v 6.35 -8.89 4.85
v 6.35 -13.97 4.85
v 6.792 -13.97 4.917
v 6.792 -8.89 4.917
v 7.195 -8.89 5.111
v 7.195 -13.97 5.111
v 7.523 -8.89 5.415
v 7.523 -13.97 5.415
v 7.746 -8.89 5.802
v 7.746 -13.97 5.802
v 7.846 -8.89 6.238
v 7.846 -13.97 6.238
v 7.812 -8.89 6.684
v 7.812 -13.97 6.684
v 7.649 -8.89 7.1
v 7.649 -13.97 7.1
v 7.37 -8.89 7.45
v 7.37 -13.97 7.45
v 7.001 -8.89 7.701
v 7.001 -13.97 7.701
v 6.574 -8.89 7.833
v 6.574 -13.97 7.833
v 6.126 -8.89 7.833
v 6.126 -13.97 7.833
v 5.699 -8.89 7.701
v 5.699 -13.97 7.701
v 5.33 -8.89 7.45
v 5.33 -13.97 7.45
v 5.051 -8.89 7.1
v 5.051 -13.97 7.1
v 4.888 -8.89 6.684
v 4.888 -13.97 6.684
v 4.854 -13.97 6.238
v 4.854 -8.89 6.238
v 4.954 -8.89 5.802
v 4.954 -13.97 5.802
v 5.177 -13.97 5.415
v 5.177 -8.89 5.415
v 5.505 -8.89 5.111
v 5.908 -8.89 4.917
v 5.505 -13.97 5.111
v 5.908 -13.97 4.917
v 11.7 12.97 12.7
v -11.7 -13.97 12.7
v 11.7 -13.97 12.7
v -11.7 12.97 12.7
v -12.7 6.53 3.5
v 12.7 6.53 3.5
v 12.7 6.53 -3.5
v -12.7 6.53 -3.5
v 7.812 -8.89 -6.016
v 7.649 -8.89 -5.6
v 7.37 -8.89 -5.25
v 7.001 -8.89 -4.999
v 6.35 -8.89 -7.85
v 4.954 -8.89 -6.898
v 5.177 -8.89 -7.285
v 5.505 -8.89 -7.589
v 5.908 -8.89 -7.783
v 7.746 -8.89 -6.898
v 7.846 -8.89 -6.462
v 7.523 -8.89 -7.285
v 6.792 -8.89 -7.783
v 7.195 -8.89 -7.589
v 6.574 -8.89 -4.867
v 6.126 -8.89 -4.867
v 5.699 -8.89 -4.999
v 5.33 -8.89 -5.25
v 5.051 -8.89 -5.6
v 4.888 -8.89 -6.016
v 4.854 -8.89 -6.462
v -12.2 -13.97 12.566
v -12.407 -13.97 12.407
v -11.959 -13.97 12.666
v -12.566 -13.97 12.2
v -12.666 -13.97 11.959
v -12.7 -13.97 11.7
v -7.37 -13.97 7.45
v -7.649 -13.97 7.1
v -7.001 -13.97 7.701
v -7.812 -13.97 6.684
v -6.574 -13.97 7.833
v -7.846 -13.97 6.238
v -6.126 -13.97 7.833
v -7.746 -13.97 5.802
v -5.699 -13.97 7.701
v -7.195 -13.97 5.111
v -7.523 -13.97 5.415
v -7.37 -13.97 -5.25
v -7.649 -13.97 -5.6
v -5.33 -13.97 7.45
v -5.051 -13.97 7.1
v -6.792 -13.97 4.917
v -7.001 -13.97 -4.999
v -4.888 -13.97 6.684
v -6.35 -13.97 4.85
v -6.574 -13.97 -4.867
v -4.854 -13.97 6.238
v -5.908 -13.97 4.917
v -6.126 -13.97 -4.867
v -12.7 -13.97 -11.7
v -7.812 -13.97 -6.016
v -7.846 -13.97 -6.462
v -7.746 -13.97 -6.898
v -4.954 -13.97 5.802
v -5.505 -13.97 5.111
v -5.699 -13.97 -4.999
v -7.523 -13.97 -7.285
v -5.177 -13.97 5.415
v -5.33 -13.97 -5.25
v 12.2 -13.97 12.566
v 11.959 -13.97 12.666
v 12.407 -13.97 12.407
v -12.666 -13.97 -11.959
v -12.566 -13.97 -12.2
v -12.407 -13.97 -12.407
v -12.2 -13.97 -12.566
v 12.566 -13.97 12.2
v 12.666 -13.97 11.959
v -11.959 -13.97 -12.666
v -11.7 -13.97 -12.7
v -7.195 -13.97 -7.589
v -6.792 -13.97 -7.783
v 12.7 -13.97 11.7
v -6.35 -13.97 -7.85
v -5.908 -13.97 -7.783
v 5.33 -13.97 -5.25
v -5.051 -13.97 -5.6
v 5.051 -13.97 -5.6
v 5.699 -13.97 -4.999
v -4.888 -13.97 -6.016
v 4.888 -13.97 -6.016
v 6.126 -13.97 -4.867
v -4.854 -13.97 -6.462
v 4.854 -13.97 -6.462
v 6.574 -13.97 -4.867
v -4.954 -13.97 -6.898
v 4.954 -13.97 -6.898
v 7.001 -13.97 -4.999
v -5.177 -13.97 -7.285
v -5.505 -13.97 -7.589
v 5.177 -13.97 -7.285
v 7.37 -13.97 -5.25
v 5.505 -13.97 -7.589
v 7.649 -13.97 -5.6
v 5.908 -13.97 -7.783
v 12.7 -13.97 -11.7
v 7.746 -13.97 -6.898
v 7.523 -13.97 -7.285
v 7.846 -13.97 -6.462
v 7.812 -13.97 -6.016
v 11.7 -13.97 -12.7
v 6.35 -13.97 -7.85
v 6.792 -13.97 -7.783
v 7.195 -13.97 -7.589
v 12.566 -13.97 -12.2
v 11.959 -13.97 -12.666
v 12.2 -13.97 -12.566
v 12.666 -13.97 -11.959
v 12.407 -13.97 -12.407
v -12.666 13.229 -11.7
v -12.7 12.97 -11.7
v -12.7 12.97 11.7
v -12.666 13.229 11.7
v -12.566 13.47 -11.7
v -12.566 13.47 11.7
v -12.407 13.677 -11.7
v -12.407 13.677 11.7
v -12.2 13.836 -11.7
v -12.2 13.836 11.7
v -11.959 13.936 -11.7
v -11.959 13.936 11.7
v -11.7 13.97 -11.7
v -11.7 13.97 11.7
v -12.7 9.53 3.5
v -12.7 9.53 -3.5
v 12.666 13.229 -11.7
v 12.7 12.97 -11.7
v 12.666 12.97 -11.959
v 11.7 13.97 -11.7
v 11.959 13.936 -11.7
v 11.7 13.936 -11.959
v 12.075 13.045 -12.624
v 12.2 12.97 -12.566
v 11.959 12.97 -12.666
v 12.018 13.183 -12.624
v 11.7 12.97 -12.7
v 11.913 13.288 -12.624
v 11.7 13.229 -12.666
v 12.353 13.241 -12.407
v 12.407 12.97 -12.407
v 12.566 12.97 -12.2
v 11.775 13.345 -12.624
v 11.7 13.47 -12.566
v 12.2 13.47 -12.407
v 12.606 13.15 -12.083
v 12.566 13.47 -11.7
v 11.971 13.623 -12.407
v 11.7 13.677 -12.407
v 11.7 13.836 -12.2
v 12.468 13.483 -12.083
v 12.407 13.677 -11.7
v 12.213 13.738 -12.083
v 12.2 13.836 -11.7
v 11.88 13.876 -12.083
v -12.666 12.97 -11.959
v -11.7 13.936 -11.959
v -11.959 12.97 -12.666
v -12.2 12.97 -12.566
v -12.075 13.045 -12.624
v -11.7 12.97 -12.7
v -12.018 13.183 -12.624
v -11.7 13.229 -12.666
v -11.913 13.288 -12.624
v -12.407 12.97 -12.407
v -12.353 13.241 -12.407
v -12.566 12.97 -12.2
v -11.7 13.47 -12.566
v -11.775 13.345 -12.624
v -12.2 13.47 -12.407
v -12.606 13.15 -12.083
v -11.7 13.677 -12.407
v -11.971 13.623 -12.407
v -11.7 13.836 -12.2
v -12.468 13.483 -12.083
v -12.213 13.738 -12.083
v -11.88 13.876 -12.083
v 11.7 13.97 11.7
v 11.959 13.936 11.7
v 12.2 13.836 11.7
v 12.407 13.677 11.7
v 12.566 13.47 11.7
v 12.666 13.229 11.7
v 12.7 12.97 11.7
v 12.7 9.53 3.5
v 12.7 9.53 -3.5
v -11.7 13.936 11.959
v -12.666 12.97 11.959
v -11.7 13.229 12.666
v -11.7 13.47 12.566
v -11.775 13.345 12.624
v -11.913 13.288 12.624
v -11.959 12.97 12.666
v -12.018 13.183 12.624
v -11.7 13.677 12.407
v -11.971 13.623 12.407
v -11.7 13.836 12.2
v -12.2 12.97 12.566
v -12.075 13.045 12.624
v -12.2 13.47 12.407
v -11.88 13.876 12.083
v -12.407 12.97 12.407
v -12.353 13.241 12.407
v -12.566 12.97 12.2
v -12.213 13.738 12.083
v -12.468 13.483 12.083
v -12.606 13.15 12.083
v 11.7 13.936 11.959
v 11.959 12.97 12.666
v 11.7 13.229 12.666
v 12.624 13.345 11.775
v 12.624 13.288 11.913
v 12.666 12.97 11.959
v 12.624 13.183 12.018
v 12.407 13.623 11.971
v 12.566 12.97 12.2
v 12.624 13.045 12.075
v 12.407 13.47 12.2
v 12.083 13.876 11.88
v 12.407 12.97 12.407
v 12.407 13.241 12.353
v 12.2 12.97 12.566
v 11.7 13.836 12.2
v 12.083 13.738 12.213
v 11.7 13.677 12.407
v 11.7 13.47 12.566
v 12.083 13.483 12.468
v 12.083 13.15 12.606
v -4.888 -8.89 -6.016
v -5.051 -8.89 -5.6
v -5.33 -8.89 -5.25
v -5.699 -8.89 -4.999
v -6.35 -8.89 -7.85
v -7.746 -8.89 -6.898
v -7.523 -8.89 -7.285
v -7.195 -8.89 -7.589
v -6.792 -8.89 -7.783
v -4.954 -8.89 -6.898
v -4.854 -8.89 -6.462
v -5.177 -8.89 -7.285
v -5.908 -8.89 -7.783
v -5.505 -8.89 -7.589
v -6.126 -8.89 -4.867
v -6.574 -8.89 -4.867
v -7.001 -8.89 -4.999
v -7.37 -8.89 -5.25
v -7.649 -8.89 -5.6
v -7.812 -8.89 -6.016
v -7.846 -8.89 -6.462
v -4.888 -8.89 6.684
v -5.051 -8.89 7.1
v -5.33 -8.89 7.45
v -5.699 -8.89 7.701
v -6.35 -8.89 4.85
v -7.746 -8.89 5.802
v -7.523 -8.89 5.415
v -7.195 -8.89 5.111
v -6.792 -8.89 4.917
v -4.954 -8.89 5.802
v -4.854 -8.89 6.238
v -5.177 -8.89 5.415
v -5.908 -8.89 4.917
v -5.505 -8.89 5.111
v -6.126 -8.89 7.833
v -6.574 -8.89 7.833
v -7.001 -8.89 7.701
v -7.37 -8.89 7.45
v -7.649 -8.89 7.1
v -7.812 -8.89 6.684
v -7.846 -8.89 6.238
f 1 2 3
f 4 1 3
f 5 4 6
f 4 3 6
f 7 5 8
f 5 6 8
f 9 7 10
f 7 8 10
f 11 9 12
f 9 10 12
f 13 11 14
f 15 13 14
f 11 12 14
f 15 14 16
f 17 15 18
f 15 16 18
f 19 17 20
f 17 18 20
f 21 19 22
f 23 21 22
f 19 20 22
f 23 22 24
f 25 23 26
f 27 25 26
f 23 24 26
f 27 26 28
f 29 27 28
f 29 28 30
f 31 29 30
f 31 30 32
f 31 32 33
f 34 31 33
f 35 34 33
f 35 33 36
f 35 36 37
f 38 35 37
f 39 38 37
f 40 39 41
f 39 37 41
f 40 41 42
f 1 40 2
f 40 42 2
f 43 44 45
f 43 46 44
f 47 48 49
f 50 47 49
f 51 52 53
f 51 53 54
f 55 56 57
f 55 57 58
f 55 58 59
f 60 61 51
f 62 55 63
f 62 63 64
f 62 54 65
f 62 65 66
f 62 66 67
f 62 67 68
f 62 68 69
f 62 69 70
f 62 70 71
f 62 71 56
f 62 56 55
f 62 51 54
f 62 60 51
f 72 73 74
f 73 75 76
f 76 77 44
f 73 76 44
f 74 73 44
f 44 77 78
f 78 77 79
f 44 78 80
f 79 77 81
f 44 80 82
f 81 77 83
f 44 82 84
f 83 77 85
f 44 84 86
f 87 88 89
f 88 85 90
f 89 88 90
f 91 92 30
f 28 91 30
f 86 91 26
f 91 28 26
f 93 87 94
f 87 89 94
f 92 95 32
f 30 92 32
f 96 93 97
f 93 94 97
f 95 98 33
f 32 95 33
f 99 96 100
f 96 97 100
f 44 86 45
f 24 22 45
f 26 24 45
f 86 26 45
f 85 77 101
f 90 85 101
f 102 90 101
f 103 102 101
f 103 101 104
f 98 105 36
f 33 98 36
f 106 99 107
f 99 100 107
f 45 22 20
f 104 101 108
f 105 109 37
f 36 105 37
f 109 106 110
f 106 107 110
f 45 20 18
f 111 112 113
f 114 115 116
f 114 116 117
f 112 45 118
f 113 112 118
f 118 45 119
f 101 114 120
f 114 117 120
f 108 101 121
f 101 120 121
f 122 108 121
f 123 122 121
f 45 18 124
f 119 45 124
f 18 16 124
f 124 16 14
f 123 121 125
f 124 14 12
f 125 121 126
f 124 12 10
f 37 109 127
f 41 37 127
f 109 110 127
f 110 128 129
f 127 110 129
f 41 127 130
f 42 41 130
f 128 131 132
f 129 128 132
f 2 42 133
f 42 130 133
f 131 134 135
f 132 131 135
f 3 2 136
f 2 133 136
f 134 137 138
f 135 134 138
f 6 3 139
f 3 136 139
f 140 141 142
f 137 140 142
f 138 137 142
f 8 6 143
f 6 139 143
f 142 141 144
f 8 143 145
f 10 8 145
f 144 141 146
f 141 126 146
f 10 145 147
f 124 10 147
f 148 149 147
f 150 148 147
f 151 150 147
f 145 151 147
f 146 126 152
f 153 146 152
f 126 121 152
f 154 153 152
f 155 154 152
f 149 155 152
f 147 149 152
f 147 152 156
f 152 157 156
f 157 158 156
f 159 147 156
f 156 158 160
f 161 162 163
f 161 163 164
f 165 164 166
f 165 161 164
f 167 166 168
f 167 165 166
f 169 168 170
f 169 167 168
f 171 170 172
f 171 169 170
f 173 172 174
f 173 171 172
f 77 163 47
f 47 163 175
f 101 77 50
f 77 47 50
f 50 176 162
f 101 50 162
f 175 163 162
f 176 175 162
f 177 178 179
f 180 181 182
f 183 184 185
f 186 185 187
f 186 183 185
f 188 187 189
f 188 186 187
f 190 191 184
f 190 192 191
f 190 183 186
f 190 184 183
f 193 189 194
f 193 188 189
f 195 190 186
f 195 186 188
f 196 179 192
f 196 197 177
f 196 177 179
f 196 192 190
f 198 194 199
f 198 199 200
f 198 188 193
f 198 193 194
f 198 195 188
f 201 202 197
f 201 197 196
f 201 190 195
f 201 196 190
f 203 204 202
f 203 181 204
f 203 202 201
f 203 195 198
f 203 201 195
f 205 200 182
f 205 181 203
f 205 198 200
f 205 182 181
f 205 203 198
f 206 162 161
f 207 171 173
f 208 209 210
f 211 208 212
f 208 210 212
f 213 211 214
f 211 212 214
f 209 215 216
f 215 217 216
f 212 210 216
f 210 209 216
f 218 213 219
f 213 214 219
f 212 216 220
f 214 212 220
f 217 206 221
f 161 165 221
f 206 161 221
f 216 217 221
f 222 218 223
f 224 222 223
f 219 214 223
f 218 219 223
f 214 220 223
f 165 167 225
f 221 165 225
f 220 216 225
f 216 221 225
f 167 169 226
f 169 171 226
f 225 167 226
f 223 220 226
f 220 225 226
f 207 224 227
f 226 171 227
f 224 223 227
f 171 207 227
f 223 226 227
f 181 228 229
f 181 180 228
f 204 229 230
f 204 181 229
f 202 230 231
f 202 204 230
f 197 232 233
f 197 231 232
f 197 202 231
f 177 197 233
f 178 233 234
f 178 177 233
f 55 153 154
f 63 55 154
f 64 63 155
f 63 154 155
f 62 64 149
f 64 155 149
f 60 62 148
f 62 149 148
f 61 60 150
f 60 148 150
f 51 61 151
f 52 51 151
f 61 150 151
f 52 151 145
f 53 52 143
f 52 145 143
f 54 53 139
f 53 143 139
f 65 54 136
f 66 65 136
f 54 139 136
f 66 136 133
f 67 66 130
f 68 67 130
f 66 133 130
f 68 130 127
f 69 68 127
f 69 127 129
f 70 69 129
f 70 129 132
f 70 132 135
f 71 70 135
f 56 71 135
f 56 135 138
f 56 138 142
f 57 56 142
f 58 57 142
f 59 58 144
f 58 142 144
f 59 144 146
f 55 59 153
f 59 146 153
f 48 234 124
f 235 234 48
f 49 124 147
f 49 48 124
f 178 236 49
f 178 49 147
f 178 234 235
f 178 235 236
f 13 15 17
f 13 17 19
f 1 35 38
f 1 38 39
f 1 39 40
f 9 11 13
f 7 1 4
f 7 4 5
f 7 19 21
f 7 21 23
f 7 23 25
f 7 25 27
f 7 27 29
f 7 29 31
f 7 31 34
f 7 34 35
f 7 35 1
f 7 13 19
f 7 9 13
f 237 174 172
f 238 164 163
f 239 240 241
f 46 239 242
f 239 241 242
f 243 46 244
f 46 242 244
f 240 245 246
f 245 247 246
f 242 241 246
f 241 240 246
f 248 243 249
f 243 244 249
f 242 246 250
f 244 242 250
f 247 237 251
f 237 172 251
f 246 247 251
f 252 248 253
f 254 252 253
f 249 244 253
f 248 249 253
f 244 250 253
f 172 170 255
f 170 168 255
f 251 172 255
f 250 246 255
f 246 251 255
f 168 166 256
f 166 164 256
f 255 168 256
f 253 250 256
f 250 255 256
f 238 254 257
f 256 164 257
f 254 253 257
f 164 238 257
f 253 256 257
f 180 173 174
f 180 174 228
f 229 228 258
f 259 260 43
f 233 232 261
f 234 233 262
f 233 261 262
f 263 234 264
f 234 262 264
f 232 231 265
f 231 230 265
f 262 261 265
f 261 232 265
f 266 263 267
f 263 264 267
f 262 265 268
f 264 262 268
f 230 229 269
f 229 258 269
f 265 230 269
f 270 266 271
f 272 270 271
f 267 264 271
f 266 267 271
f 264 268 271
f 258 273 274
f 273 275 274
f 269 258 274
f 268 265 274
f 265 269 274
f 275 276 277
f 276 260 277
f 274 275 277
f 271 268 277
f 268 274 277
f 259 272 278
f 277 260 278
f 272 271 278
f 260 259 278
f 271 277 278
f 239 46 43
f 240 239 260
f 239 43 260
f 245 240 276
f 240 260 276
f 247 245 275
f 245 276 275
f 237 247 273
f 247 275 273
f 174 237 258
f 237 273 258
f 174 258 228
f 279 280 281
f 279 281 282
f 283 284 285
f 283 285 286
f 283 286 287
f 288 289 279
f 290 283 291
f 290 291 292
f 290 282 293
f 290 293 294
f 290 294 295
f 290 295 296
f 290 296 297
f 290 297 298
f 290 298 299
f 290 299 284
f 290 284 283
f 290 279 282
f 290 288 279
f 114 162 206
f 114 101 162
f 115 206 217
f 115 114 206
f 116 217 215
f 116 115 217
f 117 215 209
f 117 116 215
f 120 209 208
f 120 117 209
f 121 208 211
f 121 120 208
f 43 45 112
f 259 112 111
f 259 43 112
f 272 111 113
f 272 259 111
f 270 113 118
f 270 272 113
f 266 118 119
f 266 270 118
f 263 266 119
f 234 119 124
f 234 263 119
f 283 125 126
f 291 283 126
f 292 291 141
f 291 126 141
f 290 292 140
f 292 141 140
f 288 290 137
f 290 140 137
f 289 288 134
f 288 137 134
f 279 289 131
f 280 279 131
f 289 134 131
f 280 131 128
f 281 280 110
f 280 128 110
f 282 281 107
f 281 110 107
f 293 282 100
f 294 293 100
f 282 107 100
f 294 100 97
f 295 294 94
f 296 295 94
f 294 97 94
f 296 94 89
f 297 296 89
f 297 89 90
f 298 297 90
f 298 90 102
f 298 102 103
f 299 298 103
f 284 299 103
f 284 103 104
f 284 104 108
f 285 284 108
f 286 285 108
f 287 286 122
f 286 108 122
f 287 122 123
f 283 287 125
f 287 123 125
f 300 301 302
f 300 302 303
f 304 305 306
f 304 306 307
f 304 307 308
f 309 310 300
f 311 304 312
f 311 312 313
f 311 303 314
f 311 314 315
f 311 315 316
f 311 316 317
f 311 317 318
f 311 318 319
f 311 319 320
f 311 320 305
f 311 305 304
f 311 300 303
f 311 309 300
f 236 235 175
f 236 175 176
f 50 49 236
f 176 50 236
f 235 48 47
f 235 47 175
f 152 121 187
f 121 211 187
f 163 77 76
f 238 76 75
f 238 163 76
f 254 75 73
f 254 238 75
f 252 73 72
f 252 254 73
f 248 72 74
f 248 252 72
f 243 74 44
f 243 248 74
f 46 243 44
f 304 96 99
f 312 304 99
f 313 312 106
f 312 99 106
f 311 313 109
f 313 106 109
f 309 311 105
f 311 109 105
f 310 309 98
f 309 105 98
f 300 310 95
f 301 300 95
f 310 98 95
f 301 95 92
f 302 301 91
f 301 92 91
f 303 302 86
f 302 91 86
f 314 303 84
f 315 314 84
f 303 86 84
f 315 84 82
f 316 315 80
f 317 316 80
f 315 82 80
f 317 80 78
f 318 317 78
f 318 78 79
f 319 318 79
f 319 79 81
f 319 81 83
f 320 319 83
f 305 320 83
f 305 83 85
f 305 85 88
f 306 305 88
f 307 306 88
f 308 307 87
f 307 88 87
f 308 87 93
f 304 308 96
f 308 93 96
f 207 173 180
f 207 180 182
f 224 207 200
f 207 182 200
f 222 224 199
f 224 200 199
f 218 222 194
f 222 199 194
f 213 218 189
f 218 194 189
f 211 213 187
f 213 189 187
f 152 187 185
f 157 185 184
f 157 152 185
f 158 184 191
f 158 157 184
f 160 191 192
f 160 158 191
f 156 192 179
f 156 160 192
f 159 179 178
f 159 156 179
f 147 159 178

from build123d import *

# Parameters (mm, degrees)
SKETCH1_W           = 25.4
SKETCH1_H           = 25.4
BOSS_EXTRUDE1_DEPTH = 13.97
SKETCH2_R           = 1.5
CUT_EXTRUDE1_DEPTH  = 5.08
SKETCH3_W           = 7
SKETCH3_H           = 3
CUT_EXTRUDE2_DEPTH  = 32.648236918
FILLET1_R           = 1


with BuildPart() as part:
    # Sketch1 → Boss-Extrude1 (new, symmetric)
    with BuildSketch(Plane(origin=(0, 0, 0), x_dir=(1, 0, 0), z_dir=(0, 1, 0))):
        Rectangle(SKETCH1_W, SKETCH1_H)
    extrude(amount=BOSS_EXTRUDE1_DEPTH, both=True)

    # Sketch2 → Cut-Extrude1 (cut)
    with BuildSketch(Plane.XZ.offset(13.97)):
        with Locations(Location((-6.35, 6.35, 0), (0, 0, 270))):
            Circle(SKETCH2_R)
        with Locations(Location((6.35, 6.35, 0), (0, 0, 270))):
            Circle(SKETCH2_R)
        with Locations(Location((6.35, -6.35, 0), (0, 0, 270))):
            Circle(SKETCH2_R)
        with Locations(Location((-6.35, -6.35, 0), (0, 0, 270))):
            Circle(SKETCH2_R)
    extrude(amount=-CUT_EXTRUDE1_DEPTH, mode=Mode.SUBTRACT)

    # Sketch3 → Cut-Extrude2 (cut, through all)
    with BuildSketch(Plane(origin=(12.7, 0, 0), x_dir=(0, 0, -1), z_dir=(1, 0, 0))):
        with Locations((0, 8.03)):
            Rectangle(SKETCH3_W, SKETCH3_H)
    extrude(amount=-CUT_EXTRUDE2_DEPTH, mode=Mode.SUBTRACT)

    # Fillet1
    fillet1_edges = [part.edges().sort_by_distance(p)[0] for p in [
        (-12.7, 13.97, 0),
        (0, 13.97, 12.7),
        (12.7, 13.97, 0),
        (12.7, 0, 12.7),
        (-12.7, 0, 12.7),
        (-12.7, 0, -12.7),
        (12.7, 0, -12.7),
        (0, 13.97, -12.7),
    ]]
    fillet(fillet1_edges, radius=FILLET1_R)


solid = part.part
